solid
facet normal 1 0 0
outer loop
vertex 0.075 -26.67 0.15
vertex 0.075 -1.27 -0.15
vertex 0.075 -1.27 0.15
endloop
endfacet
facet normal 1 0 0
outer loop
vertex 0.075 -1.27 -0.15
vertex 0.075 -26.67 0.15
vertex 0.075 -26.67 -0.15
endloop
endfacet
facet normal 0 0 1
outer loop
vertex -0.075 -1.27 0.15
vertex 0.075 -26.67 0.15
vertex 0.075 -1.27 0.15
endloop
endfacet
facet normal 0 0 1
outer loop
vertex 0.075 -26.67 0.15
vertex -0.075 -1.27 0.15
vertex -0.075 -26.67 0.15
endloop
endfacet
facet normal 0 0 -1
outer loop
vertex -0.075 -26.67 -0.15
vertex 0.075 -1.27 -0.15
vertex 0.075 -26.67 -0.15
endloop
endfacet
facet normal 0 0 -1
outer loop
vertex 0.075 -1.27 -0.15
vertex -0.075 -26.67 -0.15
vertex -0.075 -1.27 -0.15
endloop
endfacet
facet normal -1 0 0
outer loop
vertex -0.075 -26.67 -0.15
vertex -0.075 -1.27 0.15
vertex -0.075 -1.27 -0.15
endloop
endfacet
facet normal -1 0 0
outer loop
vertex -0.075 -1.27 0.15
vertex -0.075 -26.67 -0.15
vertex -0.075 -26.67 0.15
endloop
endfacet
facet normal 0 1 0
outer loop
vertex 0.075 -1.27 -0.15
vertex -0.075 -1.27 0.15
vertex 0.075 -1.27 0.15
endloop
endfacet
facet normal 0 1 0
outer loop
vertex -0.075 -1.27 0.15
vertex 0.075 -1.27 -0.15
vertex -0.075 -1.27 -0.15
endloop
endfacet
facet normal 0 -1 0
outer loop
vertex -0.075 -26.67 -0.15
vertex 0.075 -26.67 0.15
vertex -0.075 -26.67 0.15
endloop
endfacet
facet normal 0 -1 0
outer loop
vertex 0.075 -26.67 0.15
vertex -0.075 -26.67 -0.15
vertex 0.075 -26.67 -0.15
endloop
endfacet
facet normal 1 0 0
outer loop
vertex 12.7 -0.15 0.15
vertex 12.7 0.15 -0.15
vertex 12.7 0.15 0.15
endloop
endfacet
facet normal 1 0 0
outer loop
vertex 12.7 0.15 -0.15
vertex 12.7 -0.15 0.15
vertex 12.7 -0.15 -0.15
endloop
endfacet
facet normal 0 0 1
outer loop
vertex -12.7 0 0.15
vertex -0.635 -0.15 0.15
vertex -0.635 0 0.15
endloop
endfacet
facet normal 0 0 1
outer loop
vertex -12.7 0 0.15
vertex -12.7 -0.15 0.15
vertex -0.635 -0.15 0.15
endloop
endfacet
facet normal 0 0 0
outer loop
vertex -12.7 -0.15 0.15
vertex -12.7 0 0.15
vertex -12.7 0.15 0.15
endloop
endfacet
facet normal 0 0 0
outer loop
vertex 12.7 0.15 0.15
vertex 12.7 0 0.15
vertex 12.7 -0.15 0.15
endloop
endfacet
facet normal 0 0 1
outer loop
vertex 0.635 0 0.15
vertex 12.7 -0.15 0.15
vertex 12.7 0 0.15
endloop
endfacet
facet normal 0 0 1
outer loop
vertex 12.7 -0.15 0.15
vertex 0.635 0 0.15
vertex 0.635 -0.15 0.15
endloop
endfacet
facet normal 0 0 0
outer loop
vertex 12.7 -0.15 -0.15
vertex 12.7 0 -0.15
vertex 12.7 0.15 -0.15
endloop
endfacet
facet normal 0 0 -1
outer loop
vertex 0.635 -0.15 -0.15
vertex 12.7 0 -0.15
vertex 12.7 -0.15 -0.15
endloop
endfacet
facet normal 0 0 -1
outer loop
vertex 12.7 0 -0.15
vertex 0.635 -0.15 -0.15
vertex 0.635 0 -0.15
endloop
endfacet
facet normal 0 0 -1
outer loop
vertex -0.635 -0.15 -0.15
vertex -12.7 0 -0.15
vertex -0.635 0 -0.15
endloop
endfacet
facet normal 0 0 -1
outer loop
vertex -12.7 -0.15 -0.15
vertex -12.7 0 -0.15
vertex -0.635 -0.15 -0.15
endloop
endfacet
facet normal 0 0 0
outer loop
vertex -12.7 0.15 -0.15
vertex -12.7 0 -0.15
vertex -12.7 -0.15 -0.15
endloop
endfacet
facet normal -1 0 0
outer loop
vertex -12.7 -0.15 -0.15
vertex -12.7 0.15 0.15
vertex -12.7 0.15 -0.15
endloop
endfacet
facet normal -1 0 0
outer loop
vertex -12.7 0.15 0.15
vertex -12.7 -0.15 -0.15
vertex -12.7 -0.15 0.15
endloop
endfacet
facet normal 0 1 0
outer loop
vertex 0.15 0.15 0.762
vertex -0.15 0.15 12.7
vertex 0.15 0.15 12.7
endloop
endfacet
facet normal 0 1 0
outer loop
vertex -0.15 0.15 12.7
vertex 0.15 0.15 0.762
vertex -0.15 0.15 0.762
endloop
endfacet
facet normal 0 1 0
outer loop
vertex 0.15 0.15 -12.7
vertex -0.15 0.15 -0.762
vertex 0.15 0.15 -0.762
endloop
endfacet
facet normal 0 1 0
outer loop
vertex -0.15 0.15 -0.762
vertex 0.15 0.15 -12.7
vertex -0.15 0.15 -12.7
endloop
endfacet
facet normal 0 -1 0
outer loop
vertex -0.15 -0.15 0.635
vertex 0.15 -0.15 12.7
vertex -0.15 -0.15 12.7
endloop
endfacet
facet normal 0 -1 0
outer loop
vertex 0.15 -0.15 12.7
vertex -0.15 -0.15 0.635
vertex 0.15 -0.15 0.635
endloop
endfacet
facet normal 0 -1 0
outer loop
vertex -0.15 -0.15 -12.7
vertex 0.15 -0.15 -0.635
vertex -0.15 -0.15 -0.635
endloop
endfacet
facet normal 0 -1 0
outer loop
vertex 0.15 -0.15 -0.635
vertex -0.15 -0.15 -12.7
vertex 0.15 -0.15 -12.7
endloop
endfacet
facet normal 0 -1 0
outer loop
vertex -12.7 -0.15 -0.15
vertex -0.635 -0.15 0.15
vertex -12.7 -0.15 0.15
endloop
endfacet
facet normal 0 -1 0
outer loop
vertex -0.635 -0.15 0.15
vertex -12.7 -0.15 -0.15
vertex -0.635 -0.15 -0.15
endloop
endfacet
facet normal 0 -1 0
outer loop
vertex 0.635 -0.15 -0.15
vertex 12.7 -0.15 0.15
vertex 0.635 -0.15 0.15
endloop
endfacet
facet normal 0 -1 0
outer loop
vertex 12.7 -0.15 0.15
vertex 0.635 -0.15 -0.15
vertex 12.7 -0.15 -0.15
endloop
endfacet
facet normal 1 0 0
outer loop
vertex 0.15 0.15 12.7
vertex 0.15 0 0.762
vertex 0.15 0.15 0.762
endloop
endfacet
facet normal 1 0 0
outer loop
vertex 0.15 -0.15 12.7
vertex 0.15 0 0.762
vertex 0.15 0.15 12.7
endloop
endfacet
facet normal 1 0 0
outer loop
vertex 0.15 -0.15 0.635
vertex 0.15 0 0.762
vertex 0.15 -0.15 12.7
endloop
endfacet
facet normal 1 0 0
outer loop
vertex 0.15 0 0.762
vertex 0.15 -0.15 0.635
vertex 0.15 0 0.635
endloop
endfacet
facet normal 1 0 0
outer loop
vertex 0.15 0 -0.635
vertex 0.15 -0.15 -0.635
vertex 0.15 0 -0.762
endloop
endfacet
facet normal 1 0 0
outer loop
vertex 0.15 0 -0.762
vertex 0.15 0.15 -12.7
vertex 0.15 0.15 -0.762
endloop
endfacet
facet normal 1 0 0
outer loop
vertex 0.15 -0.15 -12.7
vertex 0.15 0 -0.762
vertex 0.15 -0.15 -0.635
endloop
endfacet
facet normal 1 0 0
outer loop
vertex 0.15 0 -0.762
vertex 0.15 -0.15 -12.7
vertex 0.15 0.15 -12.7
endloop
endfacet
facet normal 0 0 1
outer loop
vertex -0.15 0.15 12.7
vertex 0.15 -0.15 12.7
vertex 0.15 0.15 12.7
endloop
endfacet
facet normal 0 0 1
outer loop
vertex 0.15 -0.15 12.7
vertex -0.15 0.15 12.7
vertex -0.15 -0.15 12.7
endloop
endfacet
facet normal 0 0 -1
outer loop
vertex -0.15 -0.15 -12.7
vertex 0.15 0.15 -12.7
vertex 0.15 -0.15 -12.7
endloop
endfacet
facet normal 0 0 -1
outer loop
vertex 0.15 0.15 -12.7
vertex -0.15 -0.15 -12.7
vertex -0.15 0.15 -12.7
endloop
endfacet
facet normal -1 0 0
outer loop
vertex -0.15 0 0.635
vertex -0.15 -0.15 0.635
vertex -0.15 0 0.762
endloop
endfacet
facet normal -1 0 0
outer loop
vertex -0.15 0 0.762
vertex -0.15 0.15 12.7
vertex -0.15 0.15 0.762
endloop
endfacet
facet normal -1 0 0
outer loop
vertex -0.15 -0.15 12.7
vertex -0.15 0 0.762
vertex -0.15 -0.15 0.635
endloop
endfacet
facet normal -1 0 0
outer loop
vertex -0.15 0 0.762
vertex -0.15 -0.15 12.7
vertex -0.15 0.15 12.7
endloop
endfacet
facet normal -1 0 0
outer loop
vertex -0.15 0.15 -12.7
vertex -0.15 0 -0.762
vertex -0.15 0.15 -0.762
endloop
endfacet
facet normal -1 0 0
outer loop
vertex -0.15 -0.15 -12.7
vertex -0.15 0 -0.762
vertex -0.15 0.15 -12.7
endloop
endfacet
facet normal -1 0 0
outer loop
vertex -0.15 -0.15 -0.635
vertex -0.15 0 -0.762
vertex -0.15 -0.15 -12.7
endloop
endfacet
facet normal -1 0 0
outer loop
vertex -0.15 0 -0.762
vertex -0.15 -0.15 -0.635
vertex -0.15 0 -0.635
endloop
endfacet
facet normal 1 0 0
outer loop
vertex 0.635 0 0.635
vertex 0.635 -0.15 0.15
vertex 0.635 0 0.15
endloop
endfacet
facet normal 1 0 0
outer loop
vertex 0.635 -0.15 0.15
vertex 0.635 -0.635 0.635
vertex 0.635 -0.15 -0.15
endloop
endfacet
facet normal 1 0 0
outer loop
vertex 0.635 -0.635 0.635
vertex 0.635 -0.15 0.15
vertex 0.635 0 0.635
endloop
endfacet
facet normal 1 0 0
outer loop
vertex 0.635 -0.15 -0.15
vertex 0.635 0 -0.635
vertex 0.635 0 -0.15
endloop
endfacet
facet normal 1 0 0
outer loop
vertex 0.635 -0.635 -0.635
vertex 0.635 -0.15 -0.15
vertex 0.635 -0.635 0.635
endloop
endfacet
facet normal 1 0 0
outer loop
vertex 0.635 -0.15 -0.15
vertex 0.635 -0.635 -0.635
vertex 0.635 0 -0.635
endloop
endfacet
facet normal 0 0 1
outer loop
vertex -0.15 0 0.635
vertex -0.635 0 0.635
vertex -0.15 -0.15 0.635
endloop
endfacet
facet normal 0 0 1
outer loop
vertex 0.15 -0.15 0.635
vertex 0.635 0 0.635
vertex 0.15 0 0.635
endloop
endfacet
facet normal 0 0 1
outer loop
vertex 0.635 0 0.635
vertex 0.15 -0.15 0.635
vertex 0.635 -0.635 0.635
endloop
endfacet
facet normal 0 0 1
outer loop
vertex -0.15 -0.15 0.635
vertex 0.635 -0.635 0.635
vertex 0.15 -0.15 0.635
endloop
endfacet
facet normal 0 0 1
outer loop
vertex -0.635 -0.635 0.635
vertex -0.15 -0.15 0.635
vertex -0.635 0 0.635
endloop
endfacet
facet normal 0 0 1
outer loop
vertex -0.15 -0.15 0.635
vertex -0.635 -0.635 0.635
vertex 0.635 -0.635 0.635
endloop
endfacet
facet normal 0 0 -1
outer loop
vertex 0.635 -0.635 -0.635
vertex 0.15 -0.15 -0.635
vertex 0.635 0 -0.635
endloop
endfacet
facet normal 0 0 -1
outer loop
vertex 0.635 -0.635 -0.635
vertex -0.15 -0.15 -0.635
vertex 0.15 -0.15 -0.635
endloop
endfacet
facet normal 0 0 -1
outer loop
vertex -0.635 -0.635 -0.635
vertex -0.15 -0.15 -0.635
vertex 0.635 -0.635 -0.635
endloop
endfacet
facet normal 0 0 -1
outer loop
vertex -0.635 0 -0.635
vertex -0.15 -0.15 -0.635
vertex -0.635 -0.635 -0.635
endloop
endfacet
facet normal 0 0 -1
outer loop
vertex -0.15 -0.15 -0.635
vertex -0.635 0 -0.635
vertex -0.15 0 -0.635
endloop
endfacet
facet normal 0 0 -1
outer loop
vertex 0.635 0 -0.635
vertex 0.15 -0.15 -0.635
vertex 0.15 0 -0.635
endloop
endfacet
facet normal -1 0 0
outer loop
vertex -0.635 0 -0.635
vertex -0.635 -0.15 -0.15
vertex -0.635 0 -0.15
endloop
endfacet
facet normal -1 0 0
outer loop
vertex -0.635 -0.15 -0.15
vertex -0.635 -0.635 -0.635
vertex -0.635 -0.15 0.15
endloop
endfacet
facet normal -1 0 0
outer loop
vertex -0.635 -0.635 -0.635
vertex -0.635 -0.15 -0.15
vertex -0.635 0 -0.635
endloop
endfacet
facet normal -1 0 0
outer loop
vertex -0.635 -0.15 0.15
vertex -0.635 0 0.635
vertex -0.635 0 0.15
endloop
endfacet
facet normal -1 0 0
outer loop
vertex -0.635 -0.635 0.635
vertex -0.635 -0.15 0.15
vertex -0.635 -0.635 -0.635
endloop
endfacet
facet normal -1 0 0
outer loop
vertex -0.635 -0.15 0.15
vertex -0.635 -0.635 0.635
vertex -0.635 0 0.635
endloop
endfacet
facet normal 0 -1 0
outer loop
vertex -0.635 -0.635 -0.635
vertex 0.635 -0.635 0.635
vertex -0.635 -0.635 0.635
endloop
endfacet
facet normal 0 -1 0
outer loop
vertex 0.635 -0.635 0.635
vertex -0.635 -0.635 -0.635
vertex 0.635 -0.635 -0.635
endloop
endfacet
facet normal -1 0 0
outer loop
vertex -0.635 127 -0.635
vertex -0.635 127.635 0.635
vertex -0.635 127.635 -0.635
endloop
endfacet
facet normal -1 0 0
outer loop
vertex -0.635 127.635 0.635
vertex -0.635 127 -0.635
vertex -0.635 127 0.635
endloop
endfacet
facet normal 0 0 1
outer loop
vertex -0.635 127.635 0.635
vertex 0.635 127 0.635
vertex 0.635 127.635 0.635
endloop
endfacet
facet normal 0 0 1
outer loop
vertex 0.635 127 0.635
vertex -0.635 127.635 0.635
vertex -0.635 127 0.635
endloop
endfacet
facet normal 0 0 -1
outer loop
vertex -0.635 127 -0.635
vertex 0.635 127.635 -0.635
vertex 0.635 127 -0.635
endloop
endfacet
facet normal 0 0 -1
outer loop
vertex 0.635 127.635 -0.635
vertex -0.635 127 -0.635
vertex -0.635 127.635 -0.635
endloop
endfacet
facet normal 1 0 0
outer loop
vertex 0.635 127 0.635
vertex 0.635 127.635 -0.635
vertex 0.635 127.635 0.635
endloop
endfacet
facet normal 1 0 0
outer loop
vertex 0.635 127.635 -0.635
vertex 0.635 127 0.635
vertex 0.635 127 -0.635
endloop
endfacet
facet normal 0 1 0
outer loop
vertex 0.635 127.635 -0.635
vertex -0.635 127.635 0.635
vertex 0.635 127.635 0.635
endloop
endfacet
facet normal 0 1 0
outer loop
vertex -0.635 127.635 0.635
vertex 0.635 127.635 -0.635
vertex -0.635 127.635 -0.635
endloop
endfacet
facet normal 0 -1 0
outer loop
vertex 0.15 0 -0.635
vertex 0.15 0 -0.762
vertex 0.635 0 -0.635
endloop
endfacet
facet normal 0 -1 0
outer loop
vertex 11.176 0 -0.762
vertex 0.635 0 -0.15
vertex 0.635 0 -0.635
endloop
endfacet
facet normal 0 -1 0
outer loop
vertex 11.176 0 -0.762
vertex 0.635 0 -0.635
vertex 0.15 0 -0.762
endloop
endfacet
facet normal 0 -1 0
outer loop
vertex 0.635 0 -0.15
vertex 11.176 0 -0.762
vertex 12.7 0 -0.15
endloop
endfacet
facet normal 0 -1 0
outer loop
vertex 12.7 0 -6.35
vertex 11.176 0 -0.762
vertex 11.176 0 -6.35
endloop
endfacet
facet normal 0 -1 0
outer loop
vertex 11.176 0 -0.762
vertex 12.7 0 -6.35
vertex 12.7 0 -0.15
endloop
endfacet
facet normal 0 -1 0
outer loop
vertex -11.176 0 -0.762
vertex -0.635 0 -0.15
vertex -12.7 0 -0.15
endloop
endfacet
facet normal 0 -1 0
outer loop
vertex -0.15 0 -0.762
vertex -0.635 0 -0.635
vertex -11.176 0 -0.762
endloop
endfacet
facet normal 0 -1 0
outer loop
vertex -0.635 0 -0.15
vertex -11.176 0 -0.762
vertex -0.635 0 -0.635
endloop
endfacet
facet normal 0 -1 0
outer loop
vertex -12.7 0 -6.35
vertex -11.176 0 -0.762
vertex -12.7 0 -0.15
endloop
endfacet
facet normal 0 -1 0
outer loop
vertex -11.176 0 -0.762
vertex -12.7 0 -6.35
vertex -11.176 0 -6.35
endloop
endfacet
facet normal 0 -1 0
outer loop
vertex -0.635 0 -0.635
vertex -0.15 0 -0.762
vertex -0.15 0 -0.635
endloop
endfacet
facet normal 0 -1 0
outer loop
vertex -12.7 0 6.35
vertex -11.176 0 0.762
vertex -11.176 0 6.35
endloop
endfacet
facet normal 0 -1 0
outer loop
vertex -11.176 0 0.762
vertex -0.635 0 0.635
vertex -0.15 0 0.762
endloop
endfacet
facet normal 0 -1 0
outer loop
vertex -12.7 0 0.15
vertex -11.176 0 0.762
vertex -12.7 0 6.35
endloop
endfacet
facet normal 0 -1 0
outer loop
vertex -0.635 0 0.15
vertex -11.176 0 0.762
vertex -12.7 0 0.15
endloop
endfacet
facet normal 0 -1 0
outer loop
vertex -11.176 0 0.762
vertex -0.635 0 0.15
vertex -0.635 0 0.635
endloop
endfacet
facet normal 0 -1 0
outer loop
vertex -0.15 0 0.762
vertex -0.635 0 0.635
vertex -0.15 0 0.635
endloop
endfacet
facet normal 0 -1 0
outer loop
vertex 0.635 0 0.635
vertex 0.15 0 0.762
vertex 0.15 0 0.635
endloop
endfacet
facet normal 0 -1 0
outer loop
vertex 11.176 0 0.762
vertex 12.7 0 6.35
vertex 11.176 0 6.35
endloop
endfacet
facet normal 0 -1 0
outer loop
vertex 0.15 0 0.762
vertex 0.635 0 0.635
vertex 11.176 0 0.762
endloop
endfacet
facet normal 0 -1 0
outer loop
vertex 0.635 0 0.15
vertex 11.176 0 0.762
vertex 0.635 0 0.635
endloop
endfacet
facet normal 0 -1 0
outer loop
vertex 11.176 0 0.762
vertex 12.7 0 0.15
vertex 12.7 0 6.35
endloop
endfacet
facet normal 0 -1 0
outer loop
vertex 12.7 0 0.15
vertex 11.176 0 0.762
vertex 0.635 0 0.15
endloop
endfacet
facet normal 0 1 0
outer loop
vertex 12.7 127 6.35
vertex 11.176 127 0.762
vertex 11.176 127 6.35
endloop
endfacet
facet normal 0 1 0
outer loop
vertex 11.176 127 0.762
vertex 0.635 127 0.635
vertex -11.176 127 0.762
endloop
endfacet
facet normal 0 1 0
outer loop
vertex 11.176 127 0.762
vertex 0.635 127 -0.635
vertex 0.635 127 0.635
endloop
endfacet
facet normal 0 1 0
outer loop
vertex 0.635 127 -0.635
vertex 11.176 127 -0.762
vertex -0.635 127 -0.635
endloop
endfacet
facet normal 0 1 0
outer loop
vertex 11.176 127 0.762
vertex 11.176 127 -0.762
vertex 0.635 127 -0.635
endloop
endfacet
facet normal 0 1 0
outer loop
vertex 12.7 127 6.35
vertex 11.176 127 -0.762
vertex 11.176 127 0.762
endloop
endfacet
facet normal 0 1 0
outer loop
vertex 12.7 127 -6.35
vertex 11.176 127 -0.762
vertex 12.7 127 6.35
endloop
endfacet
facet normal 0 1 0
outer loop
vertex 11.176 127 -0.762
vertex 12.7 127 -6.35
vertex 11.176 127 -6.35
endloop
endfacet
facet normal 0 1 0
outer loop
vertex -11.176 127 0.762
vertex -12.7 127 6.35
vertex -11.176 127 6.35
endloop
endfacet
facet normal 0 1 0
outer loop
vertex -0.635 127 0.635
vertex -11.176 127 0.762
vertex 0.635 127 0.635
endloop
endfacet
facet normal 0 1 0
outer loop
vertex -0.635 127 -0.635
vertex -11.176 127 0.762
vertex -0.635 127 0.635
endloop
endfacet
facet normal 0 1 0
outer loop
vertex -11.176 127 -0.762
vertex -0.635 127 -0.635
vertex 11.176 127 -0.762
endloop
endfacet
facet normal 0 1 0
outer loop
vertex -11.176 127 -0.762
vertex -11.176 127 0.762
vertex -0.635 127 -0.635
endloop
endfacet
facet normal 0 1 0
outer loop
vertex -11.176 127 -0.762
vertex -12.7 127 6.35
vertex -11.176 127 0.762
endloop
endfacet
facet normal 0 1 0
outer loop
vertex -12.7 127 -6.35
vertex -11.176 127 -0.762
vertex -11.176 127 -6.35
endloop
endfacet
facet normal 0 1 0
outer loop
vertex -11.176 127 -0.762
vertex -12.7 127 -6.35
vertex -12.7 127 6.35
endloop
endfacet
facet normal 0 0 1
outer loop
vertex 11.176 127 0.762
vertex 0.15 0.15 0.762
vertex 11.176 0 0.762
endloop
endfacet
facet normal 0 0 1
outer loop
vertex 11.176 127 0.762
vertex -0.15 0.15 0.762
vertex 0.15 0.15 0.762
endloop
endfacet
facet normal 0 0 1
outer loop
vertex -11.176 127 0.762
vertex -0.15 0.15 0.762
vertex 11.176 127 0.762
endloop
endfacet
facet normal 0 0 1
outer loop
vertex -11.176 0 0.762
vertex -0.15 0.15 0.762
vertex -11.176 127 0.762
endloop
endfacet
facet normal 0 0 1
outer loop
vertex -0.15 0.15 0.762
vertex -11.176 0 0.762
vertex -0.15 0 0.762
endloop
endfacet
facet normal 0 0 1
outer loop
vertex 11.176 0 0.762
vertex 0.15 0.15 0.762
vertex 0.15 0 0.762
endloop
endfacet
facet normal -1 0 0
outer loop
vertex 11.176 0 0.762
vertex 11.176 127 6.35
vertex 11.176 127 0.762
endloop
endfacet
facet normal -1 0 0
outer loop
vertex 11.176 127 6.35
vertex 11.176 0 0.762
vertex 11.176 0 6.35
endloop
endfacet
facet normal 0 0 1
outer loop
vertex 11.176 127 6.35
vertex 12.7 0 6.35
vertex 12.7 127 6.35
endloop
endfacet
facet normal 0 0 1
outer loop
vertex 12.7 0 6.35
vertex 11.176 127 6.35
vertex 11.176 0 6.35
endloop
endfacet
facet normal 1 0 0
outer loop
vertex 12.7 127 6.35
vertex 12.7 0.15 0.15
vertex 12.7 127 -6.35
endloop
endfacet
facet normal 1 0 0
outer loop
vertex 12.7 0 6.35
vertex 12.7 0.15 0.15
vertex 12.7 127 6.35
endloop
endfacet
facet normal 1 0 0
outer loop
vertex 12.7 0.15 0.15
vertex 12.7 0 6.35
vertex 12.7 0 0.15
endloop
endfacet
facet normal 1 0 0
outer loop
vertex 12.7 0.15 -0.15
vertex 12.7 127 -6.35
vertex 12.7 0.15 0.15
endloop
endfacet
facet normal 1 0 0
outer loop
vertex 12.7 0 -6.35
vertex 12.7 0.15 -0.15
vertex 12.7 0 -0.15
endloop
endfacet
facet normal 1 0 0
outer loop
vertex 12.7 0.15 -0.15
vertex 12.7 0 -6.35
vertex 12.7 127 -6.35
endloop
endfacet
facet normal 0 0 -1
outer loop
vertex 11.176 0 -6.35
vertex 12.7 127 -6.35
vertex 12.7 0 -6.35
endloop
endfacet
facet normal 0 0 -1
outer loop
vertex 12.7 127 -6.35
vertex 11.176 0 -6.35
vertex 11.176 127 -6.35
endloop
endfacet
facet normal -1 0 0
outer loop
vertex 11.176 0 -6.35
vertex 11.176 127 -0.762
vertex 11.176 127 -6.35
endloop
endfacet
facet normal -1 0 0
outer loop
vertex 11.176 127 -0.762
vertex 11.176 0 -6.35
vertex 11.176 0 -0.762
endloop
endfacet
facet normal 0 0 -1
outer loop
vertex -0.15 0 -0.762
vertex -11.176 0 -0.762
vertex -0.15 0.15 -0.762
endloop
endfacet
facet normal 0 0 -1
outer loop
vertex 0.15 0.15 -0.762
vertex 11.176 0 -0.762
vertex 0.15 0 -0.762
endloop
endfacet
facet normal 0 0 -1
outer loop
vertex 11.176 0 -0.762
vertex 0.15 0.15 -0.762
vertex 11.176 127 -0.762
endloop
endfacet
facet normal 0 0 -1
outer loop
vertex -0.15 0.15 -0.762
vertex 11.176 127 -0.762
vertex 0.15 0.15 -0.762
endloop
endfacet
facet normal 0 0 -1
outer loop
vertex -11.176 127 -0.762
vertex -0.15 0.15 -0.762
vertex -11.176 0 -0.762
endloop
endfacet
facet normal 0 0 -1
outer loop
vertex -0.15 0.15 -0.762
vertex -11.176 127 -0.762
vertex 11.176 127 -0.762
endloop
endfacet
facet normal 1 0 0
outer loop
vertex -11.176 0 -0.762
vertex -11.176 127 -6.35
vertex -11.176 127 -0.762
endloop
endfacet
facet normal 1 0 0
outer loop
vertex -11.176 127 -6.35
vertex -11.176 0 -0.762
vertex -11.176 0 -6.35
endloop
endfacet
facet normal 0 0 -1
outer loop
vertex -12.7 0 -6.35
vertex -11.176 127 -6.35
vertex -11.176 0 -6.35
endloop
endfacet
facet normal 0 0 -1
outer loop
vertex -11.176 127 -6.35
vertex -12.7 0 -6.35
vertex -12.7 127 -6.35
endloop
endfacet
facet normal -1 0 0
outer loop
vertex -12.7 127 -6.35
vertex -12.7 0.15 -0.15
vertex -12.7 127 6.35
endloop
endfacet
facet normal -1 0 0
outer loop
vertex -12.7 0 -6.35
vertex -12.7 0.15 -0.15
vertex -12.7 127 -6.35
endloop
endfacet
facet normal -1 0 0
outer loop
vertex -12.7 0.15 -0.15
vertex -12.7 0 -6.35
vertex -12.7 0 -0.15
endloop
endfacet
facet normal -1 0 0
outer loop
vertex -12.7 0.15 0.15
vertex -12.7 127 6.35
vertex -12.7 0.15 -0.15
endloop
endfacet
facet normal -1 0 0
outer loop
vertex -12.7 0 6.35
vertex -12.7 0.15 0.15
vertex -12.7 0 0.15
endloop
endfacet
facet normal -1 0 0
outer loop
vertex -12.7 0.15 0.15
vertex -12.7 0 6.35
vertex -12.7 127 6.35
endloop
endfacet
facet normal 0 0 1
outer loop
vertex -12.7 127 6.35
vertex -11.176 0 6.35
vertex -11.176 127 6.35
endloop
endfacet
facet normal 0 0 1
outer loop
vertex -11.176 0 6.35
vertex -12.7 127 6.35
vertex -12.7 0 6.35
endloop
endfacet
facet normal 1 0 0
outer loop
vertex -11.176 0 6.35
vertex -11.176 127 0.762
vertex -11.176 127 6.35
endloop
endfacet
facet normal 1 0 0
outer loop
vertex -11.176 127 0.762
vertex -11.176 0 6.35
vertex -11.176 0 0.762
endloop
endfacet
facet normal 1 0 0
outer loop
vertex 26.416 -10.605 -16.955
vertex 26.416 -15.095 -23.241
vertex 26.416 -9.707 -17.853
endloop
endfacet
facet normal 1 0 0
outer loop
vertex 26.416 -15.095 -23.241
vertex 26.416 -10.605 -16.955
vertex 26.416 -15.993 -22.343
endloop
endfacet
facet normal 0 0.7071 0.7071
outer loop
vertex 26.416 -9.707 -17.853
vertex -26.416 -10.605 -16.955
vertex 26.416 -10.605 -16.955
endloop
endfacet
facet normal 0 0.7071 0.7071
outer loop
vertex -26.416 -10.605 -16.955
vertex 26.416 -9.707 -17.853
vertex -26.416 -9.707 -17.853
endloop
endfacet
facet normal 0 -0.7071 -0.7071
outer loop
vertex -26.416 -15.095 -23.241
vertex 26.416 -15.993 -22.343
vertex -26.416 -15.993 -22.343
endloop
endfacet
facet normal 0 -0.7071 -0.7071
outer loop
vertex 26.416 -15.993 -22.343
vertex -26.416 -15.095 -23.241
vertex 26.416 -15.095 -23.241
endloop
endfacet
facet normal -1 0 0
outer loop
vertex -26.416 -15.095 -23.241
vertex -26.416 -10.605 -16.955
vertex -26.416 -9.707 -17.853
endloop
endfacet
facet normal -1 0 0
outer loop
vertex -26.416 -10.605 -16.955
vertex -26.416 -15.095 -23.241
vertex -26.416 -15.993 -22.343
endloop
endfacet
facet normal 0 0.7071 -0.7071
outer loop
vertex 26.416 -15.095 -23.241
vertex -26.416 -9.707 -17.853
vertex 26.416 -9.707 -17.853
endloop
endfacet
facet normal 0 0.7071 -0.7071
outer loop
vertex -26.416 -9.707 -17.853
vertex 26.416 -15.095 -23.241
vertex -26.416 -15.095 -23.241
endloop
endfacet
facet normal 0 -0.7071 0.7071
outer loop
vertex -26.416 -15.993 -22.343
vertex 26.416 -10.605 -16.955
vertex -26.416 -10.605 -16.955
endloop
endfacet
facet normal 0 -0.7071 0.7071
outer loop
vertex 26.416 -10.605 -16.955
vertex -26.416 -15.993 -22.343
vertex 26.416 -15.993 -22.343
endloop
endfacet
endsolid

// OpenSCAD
include <../mo/mo.scad>

module moHExtrusion( spec, p = 0, info = false ) {
  color( Yellow ) {
    moPitch( 3 ) {
      linear_extrude( height = spec[ 0 ] ) {   
        polygon( [ [ -spec[1]/2, -spec[3]/2 ], [ -spec[1]/2, -spec[2]/2 ], [ -spec[1]/2+spec[3], -spec[2]/2 ], [ -spec[1]/2+spec[3], -spec[3]/2 ], [ spec[1]/2-spec[3], -spec[3]/2 ], [ spec[1]/2-spec[3], -spec[2]/2 ],
                   [ spec[1]/2, -spec[2]/2 ],
                   [ spec[1]/2, -spec[3]/2 ], [ spec[1]/2,spec[2]/2 ], [ spec[1]/2-spec[3],spec[2]/2 ], [ spec[1]/2-spec[3],spec[3]/2 ], 
                   [ -spec[1]/2+spec[3],spec[3]/2 ], [ -spec[1]/2+spec[3],spec[2]/2 ], [-spec[1]/2,spec[2]/2 ] ] );       
      }
    }
  }
  
  if ( info ) {
    moPartOrigin();
    //echo( "SPEC:", spec );
    for ( i = [ 0 : 1 ] )
      moMoveTo( moHExtrusionPosition( i, spec ) )
        moPosition( i );
  }
  if ( $name )
    moPartLabel( parent_module( 1 ) );

}

function moHExtrusionPosition( p = 0, spec ) =
  ( p == 0 ) ?  [ [0, 0, 0], [0,0,1],0 ] : [ [0, spec[ 0 ], 0], [ 0,0,1],180 ];

demoSpec = [ 5 * in, 1 * in, 0.5 * in, 0.06 * in ];

moMoveOriginTo( moHExtrusionPosition( 0, demoSpec ) )
  moHExtrusion( demoSpec, 0, info = true, $name=true );

echo( moHExtrusionPosition( 0, demoSpec ) );
echo( moHExtrusionPosition( 1, demoSpec ) );
